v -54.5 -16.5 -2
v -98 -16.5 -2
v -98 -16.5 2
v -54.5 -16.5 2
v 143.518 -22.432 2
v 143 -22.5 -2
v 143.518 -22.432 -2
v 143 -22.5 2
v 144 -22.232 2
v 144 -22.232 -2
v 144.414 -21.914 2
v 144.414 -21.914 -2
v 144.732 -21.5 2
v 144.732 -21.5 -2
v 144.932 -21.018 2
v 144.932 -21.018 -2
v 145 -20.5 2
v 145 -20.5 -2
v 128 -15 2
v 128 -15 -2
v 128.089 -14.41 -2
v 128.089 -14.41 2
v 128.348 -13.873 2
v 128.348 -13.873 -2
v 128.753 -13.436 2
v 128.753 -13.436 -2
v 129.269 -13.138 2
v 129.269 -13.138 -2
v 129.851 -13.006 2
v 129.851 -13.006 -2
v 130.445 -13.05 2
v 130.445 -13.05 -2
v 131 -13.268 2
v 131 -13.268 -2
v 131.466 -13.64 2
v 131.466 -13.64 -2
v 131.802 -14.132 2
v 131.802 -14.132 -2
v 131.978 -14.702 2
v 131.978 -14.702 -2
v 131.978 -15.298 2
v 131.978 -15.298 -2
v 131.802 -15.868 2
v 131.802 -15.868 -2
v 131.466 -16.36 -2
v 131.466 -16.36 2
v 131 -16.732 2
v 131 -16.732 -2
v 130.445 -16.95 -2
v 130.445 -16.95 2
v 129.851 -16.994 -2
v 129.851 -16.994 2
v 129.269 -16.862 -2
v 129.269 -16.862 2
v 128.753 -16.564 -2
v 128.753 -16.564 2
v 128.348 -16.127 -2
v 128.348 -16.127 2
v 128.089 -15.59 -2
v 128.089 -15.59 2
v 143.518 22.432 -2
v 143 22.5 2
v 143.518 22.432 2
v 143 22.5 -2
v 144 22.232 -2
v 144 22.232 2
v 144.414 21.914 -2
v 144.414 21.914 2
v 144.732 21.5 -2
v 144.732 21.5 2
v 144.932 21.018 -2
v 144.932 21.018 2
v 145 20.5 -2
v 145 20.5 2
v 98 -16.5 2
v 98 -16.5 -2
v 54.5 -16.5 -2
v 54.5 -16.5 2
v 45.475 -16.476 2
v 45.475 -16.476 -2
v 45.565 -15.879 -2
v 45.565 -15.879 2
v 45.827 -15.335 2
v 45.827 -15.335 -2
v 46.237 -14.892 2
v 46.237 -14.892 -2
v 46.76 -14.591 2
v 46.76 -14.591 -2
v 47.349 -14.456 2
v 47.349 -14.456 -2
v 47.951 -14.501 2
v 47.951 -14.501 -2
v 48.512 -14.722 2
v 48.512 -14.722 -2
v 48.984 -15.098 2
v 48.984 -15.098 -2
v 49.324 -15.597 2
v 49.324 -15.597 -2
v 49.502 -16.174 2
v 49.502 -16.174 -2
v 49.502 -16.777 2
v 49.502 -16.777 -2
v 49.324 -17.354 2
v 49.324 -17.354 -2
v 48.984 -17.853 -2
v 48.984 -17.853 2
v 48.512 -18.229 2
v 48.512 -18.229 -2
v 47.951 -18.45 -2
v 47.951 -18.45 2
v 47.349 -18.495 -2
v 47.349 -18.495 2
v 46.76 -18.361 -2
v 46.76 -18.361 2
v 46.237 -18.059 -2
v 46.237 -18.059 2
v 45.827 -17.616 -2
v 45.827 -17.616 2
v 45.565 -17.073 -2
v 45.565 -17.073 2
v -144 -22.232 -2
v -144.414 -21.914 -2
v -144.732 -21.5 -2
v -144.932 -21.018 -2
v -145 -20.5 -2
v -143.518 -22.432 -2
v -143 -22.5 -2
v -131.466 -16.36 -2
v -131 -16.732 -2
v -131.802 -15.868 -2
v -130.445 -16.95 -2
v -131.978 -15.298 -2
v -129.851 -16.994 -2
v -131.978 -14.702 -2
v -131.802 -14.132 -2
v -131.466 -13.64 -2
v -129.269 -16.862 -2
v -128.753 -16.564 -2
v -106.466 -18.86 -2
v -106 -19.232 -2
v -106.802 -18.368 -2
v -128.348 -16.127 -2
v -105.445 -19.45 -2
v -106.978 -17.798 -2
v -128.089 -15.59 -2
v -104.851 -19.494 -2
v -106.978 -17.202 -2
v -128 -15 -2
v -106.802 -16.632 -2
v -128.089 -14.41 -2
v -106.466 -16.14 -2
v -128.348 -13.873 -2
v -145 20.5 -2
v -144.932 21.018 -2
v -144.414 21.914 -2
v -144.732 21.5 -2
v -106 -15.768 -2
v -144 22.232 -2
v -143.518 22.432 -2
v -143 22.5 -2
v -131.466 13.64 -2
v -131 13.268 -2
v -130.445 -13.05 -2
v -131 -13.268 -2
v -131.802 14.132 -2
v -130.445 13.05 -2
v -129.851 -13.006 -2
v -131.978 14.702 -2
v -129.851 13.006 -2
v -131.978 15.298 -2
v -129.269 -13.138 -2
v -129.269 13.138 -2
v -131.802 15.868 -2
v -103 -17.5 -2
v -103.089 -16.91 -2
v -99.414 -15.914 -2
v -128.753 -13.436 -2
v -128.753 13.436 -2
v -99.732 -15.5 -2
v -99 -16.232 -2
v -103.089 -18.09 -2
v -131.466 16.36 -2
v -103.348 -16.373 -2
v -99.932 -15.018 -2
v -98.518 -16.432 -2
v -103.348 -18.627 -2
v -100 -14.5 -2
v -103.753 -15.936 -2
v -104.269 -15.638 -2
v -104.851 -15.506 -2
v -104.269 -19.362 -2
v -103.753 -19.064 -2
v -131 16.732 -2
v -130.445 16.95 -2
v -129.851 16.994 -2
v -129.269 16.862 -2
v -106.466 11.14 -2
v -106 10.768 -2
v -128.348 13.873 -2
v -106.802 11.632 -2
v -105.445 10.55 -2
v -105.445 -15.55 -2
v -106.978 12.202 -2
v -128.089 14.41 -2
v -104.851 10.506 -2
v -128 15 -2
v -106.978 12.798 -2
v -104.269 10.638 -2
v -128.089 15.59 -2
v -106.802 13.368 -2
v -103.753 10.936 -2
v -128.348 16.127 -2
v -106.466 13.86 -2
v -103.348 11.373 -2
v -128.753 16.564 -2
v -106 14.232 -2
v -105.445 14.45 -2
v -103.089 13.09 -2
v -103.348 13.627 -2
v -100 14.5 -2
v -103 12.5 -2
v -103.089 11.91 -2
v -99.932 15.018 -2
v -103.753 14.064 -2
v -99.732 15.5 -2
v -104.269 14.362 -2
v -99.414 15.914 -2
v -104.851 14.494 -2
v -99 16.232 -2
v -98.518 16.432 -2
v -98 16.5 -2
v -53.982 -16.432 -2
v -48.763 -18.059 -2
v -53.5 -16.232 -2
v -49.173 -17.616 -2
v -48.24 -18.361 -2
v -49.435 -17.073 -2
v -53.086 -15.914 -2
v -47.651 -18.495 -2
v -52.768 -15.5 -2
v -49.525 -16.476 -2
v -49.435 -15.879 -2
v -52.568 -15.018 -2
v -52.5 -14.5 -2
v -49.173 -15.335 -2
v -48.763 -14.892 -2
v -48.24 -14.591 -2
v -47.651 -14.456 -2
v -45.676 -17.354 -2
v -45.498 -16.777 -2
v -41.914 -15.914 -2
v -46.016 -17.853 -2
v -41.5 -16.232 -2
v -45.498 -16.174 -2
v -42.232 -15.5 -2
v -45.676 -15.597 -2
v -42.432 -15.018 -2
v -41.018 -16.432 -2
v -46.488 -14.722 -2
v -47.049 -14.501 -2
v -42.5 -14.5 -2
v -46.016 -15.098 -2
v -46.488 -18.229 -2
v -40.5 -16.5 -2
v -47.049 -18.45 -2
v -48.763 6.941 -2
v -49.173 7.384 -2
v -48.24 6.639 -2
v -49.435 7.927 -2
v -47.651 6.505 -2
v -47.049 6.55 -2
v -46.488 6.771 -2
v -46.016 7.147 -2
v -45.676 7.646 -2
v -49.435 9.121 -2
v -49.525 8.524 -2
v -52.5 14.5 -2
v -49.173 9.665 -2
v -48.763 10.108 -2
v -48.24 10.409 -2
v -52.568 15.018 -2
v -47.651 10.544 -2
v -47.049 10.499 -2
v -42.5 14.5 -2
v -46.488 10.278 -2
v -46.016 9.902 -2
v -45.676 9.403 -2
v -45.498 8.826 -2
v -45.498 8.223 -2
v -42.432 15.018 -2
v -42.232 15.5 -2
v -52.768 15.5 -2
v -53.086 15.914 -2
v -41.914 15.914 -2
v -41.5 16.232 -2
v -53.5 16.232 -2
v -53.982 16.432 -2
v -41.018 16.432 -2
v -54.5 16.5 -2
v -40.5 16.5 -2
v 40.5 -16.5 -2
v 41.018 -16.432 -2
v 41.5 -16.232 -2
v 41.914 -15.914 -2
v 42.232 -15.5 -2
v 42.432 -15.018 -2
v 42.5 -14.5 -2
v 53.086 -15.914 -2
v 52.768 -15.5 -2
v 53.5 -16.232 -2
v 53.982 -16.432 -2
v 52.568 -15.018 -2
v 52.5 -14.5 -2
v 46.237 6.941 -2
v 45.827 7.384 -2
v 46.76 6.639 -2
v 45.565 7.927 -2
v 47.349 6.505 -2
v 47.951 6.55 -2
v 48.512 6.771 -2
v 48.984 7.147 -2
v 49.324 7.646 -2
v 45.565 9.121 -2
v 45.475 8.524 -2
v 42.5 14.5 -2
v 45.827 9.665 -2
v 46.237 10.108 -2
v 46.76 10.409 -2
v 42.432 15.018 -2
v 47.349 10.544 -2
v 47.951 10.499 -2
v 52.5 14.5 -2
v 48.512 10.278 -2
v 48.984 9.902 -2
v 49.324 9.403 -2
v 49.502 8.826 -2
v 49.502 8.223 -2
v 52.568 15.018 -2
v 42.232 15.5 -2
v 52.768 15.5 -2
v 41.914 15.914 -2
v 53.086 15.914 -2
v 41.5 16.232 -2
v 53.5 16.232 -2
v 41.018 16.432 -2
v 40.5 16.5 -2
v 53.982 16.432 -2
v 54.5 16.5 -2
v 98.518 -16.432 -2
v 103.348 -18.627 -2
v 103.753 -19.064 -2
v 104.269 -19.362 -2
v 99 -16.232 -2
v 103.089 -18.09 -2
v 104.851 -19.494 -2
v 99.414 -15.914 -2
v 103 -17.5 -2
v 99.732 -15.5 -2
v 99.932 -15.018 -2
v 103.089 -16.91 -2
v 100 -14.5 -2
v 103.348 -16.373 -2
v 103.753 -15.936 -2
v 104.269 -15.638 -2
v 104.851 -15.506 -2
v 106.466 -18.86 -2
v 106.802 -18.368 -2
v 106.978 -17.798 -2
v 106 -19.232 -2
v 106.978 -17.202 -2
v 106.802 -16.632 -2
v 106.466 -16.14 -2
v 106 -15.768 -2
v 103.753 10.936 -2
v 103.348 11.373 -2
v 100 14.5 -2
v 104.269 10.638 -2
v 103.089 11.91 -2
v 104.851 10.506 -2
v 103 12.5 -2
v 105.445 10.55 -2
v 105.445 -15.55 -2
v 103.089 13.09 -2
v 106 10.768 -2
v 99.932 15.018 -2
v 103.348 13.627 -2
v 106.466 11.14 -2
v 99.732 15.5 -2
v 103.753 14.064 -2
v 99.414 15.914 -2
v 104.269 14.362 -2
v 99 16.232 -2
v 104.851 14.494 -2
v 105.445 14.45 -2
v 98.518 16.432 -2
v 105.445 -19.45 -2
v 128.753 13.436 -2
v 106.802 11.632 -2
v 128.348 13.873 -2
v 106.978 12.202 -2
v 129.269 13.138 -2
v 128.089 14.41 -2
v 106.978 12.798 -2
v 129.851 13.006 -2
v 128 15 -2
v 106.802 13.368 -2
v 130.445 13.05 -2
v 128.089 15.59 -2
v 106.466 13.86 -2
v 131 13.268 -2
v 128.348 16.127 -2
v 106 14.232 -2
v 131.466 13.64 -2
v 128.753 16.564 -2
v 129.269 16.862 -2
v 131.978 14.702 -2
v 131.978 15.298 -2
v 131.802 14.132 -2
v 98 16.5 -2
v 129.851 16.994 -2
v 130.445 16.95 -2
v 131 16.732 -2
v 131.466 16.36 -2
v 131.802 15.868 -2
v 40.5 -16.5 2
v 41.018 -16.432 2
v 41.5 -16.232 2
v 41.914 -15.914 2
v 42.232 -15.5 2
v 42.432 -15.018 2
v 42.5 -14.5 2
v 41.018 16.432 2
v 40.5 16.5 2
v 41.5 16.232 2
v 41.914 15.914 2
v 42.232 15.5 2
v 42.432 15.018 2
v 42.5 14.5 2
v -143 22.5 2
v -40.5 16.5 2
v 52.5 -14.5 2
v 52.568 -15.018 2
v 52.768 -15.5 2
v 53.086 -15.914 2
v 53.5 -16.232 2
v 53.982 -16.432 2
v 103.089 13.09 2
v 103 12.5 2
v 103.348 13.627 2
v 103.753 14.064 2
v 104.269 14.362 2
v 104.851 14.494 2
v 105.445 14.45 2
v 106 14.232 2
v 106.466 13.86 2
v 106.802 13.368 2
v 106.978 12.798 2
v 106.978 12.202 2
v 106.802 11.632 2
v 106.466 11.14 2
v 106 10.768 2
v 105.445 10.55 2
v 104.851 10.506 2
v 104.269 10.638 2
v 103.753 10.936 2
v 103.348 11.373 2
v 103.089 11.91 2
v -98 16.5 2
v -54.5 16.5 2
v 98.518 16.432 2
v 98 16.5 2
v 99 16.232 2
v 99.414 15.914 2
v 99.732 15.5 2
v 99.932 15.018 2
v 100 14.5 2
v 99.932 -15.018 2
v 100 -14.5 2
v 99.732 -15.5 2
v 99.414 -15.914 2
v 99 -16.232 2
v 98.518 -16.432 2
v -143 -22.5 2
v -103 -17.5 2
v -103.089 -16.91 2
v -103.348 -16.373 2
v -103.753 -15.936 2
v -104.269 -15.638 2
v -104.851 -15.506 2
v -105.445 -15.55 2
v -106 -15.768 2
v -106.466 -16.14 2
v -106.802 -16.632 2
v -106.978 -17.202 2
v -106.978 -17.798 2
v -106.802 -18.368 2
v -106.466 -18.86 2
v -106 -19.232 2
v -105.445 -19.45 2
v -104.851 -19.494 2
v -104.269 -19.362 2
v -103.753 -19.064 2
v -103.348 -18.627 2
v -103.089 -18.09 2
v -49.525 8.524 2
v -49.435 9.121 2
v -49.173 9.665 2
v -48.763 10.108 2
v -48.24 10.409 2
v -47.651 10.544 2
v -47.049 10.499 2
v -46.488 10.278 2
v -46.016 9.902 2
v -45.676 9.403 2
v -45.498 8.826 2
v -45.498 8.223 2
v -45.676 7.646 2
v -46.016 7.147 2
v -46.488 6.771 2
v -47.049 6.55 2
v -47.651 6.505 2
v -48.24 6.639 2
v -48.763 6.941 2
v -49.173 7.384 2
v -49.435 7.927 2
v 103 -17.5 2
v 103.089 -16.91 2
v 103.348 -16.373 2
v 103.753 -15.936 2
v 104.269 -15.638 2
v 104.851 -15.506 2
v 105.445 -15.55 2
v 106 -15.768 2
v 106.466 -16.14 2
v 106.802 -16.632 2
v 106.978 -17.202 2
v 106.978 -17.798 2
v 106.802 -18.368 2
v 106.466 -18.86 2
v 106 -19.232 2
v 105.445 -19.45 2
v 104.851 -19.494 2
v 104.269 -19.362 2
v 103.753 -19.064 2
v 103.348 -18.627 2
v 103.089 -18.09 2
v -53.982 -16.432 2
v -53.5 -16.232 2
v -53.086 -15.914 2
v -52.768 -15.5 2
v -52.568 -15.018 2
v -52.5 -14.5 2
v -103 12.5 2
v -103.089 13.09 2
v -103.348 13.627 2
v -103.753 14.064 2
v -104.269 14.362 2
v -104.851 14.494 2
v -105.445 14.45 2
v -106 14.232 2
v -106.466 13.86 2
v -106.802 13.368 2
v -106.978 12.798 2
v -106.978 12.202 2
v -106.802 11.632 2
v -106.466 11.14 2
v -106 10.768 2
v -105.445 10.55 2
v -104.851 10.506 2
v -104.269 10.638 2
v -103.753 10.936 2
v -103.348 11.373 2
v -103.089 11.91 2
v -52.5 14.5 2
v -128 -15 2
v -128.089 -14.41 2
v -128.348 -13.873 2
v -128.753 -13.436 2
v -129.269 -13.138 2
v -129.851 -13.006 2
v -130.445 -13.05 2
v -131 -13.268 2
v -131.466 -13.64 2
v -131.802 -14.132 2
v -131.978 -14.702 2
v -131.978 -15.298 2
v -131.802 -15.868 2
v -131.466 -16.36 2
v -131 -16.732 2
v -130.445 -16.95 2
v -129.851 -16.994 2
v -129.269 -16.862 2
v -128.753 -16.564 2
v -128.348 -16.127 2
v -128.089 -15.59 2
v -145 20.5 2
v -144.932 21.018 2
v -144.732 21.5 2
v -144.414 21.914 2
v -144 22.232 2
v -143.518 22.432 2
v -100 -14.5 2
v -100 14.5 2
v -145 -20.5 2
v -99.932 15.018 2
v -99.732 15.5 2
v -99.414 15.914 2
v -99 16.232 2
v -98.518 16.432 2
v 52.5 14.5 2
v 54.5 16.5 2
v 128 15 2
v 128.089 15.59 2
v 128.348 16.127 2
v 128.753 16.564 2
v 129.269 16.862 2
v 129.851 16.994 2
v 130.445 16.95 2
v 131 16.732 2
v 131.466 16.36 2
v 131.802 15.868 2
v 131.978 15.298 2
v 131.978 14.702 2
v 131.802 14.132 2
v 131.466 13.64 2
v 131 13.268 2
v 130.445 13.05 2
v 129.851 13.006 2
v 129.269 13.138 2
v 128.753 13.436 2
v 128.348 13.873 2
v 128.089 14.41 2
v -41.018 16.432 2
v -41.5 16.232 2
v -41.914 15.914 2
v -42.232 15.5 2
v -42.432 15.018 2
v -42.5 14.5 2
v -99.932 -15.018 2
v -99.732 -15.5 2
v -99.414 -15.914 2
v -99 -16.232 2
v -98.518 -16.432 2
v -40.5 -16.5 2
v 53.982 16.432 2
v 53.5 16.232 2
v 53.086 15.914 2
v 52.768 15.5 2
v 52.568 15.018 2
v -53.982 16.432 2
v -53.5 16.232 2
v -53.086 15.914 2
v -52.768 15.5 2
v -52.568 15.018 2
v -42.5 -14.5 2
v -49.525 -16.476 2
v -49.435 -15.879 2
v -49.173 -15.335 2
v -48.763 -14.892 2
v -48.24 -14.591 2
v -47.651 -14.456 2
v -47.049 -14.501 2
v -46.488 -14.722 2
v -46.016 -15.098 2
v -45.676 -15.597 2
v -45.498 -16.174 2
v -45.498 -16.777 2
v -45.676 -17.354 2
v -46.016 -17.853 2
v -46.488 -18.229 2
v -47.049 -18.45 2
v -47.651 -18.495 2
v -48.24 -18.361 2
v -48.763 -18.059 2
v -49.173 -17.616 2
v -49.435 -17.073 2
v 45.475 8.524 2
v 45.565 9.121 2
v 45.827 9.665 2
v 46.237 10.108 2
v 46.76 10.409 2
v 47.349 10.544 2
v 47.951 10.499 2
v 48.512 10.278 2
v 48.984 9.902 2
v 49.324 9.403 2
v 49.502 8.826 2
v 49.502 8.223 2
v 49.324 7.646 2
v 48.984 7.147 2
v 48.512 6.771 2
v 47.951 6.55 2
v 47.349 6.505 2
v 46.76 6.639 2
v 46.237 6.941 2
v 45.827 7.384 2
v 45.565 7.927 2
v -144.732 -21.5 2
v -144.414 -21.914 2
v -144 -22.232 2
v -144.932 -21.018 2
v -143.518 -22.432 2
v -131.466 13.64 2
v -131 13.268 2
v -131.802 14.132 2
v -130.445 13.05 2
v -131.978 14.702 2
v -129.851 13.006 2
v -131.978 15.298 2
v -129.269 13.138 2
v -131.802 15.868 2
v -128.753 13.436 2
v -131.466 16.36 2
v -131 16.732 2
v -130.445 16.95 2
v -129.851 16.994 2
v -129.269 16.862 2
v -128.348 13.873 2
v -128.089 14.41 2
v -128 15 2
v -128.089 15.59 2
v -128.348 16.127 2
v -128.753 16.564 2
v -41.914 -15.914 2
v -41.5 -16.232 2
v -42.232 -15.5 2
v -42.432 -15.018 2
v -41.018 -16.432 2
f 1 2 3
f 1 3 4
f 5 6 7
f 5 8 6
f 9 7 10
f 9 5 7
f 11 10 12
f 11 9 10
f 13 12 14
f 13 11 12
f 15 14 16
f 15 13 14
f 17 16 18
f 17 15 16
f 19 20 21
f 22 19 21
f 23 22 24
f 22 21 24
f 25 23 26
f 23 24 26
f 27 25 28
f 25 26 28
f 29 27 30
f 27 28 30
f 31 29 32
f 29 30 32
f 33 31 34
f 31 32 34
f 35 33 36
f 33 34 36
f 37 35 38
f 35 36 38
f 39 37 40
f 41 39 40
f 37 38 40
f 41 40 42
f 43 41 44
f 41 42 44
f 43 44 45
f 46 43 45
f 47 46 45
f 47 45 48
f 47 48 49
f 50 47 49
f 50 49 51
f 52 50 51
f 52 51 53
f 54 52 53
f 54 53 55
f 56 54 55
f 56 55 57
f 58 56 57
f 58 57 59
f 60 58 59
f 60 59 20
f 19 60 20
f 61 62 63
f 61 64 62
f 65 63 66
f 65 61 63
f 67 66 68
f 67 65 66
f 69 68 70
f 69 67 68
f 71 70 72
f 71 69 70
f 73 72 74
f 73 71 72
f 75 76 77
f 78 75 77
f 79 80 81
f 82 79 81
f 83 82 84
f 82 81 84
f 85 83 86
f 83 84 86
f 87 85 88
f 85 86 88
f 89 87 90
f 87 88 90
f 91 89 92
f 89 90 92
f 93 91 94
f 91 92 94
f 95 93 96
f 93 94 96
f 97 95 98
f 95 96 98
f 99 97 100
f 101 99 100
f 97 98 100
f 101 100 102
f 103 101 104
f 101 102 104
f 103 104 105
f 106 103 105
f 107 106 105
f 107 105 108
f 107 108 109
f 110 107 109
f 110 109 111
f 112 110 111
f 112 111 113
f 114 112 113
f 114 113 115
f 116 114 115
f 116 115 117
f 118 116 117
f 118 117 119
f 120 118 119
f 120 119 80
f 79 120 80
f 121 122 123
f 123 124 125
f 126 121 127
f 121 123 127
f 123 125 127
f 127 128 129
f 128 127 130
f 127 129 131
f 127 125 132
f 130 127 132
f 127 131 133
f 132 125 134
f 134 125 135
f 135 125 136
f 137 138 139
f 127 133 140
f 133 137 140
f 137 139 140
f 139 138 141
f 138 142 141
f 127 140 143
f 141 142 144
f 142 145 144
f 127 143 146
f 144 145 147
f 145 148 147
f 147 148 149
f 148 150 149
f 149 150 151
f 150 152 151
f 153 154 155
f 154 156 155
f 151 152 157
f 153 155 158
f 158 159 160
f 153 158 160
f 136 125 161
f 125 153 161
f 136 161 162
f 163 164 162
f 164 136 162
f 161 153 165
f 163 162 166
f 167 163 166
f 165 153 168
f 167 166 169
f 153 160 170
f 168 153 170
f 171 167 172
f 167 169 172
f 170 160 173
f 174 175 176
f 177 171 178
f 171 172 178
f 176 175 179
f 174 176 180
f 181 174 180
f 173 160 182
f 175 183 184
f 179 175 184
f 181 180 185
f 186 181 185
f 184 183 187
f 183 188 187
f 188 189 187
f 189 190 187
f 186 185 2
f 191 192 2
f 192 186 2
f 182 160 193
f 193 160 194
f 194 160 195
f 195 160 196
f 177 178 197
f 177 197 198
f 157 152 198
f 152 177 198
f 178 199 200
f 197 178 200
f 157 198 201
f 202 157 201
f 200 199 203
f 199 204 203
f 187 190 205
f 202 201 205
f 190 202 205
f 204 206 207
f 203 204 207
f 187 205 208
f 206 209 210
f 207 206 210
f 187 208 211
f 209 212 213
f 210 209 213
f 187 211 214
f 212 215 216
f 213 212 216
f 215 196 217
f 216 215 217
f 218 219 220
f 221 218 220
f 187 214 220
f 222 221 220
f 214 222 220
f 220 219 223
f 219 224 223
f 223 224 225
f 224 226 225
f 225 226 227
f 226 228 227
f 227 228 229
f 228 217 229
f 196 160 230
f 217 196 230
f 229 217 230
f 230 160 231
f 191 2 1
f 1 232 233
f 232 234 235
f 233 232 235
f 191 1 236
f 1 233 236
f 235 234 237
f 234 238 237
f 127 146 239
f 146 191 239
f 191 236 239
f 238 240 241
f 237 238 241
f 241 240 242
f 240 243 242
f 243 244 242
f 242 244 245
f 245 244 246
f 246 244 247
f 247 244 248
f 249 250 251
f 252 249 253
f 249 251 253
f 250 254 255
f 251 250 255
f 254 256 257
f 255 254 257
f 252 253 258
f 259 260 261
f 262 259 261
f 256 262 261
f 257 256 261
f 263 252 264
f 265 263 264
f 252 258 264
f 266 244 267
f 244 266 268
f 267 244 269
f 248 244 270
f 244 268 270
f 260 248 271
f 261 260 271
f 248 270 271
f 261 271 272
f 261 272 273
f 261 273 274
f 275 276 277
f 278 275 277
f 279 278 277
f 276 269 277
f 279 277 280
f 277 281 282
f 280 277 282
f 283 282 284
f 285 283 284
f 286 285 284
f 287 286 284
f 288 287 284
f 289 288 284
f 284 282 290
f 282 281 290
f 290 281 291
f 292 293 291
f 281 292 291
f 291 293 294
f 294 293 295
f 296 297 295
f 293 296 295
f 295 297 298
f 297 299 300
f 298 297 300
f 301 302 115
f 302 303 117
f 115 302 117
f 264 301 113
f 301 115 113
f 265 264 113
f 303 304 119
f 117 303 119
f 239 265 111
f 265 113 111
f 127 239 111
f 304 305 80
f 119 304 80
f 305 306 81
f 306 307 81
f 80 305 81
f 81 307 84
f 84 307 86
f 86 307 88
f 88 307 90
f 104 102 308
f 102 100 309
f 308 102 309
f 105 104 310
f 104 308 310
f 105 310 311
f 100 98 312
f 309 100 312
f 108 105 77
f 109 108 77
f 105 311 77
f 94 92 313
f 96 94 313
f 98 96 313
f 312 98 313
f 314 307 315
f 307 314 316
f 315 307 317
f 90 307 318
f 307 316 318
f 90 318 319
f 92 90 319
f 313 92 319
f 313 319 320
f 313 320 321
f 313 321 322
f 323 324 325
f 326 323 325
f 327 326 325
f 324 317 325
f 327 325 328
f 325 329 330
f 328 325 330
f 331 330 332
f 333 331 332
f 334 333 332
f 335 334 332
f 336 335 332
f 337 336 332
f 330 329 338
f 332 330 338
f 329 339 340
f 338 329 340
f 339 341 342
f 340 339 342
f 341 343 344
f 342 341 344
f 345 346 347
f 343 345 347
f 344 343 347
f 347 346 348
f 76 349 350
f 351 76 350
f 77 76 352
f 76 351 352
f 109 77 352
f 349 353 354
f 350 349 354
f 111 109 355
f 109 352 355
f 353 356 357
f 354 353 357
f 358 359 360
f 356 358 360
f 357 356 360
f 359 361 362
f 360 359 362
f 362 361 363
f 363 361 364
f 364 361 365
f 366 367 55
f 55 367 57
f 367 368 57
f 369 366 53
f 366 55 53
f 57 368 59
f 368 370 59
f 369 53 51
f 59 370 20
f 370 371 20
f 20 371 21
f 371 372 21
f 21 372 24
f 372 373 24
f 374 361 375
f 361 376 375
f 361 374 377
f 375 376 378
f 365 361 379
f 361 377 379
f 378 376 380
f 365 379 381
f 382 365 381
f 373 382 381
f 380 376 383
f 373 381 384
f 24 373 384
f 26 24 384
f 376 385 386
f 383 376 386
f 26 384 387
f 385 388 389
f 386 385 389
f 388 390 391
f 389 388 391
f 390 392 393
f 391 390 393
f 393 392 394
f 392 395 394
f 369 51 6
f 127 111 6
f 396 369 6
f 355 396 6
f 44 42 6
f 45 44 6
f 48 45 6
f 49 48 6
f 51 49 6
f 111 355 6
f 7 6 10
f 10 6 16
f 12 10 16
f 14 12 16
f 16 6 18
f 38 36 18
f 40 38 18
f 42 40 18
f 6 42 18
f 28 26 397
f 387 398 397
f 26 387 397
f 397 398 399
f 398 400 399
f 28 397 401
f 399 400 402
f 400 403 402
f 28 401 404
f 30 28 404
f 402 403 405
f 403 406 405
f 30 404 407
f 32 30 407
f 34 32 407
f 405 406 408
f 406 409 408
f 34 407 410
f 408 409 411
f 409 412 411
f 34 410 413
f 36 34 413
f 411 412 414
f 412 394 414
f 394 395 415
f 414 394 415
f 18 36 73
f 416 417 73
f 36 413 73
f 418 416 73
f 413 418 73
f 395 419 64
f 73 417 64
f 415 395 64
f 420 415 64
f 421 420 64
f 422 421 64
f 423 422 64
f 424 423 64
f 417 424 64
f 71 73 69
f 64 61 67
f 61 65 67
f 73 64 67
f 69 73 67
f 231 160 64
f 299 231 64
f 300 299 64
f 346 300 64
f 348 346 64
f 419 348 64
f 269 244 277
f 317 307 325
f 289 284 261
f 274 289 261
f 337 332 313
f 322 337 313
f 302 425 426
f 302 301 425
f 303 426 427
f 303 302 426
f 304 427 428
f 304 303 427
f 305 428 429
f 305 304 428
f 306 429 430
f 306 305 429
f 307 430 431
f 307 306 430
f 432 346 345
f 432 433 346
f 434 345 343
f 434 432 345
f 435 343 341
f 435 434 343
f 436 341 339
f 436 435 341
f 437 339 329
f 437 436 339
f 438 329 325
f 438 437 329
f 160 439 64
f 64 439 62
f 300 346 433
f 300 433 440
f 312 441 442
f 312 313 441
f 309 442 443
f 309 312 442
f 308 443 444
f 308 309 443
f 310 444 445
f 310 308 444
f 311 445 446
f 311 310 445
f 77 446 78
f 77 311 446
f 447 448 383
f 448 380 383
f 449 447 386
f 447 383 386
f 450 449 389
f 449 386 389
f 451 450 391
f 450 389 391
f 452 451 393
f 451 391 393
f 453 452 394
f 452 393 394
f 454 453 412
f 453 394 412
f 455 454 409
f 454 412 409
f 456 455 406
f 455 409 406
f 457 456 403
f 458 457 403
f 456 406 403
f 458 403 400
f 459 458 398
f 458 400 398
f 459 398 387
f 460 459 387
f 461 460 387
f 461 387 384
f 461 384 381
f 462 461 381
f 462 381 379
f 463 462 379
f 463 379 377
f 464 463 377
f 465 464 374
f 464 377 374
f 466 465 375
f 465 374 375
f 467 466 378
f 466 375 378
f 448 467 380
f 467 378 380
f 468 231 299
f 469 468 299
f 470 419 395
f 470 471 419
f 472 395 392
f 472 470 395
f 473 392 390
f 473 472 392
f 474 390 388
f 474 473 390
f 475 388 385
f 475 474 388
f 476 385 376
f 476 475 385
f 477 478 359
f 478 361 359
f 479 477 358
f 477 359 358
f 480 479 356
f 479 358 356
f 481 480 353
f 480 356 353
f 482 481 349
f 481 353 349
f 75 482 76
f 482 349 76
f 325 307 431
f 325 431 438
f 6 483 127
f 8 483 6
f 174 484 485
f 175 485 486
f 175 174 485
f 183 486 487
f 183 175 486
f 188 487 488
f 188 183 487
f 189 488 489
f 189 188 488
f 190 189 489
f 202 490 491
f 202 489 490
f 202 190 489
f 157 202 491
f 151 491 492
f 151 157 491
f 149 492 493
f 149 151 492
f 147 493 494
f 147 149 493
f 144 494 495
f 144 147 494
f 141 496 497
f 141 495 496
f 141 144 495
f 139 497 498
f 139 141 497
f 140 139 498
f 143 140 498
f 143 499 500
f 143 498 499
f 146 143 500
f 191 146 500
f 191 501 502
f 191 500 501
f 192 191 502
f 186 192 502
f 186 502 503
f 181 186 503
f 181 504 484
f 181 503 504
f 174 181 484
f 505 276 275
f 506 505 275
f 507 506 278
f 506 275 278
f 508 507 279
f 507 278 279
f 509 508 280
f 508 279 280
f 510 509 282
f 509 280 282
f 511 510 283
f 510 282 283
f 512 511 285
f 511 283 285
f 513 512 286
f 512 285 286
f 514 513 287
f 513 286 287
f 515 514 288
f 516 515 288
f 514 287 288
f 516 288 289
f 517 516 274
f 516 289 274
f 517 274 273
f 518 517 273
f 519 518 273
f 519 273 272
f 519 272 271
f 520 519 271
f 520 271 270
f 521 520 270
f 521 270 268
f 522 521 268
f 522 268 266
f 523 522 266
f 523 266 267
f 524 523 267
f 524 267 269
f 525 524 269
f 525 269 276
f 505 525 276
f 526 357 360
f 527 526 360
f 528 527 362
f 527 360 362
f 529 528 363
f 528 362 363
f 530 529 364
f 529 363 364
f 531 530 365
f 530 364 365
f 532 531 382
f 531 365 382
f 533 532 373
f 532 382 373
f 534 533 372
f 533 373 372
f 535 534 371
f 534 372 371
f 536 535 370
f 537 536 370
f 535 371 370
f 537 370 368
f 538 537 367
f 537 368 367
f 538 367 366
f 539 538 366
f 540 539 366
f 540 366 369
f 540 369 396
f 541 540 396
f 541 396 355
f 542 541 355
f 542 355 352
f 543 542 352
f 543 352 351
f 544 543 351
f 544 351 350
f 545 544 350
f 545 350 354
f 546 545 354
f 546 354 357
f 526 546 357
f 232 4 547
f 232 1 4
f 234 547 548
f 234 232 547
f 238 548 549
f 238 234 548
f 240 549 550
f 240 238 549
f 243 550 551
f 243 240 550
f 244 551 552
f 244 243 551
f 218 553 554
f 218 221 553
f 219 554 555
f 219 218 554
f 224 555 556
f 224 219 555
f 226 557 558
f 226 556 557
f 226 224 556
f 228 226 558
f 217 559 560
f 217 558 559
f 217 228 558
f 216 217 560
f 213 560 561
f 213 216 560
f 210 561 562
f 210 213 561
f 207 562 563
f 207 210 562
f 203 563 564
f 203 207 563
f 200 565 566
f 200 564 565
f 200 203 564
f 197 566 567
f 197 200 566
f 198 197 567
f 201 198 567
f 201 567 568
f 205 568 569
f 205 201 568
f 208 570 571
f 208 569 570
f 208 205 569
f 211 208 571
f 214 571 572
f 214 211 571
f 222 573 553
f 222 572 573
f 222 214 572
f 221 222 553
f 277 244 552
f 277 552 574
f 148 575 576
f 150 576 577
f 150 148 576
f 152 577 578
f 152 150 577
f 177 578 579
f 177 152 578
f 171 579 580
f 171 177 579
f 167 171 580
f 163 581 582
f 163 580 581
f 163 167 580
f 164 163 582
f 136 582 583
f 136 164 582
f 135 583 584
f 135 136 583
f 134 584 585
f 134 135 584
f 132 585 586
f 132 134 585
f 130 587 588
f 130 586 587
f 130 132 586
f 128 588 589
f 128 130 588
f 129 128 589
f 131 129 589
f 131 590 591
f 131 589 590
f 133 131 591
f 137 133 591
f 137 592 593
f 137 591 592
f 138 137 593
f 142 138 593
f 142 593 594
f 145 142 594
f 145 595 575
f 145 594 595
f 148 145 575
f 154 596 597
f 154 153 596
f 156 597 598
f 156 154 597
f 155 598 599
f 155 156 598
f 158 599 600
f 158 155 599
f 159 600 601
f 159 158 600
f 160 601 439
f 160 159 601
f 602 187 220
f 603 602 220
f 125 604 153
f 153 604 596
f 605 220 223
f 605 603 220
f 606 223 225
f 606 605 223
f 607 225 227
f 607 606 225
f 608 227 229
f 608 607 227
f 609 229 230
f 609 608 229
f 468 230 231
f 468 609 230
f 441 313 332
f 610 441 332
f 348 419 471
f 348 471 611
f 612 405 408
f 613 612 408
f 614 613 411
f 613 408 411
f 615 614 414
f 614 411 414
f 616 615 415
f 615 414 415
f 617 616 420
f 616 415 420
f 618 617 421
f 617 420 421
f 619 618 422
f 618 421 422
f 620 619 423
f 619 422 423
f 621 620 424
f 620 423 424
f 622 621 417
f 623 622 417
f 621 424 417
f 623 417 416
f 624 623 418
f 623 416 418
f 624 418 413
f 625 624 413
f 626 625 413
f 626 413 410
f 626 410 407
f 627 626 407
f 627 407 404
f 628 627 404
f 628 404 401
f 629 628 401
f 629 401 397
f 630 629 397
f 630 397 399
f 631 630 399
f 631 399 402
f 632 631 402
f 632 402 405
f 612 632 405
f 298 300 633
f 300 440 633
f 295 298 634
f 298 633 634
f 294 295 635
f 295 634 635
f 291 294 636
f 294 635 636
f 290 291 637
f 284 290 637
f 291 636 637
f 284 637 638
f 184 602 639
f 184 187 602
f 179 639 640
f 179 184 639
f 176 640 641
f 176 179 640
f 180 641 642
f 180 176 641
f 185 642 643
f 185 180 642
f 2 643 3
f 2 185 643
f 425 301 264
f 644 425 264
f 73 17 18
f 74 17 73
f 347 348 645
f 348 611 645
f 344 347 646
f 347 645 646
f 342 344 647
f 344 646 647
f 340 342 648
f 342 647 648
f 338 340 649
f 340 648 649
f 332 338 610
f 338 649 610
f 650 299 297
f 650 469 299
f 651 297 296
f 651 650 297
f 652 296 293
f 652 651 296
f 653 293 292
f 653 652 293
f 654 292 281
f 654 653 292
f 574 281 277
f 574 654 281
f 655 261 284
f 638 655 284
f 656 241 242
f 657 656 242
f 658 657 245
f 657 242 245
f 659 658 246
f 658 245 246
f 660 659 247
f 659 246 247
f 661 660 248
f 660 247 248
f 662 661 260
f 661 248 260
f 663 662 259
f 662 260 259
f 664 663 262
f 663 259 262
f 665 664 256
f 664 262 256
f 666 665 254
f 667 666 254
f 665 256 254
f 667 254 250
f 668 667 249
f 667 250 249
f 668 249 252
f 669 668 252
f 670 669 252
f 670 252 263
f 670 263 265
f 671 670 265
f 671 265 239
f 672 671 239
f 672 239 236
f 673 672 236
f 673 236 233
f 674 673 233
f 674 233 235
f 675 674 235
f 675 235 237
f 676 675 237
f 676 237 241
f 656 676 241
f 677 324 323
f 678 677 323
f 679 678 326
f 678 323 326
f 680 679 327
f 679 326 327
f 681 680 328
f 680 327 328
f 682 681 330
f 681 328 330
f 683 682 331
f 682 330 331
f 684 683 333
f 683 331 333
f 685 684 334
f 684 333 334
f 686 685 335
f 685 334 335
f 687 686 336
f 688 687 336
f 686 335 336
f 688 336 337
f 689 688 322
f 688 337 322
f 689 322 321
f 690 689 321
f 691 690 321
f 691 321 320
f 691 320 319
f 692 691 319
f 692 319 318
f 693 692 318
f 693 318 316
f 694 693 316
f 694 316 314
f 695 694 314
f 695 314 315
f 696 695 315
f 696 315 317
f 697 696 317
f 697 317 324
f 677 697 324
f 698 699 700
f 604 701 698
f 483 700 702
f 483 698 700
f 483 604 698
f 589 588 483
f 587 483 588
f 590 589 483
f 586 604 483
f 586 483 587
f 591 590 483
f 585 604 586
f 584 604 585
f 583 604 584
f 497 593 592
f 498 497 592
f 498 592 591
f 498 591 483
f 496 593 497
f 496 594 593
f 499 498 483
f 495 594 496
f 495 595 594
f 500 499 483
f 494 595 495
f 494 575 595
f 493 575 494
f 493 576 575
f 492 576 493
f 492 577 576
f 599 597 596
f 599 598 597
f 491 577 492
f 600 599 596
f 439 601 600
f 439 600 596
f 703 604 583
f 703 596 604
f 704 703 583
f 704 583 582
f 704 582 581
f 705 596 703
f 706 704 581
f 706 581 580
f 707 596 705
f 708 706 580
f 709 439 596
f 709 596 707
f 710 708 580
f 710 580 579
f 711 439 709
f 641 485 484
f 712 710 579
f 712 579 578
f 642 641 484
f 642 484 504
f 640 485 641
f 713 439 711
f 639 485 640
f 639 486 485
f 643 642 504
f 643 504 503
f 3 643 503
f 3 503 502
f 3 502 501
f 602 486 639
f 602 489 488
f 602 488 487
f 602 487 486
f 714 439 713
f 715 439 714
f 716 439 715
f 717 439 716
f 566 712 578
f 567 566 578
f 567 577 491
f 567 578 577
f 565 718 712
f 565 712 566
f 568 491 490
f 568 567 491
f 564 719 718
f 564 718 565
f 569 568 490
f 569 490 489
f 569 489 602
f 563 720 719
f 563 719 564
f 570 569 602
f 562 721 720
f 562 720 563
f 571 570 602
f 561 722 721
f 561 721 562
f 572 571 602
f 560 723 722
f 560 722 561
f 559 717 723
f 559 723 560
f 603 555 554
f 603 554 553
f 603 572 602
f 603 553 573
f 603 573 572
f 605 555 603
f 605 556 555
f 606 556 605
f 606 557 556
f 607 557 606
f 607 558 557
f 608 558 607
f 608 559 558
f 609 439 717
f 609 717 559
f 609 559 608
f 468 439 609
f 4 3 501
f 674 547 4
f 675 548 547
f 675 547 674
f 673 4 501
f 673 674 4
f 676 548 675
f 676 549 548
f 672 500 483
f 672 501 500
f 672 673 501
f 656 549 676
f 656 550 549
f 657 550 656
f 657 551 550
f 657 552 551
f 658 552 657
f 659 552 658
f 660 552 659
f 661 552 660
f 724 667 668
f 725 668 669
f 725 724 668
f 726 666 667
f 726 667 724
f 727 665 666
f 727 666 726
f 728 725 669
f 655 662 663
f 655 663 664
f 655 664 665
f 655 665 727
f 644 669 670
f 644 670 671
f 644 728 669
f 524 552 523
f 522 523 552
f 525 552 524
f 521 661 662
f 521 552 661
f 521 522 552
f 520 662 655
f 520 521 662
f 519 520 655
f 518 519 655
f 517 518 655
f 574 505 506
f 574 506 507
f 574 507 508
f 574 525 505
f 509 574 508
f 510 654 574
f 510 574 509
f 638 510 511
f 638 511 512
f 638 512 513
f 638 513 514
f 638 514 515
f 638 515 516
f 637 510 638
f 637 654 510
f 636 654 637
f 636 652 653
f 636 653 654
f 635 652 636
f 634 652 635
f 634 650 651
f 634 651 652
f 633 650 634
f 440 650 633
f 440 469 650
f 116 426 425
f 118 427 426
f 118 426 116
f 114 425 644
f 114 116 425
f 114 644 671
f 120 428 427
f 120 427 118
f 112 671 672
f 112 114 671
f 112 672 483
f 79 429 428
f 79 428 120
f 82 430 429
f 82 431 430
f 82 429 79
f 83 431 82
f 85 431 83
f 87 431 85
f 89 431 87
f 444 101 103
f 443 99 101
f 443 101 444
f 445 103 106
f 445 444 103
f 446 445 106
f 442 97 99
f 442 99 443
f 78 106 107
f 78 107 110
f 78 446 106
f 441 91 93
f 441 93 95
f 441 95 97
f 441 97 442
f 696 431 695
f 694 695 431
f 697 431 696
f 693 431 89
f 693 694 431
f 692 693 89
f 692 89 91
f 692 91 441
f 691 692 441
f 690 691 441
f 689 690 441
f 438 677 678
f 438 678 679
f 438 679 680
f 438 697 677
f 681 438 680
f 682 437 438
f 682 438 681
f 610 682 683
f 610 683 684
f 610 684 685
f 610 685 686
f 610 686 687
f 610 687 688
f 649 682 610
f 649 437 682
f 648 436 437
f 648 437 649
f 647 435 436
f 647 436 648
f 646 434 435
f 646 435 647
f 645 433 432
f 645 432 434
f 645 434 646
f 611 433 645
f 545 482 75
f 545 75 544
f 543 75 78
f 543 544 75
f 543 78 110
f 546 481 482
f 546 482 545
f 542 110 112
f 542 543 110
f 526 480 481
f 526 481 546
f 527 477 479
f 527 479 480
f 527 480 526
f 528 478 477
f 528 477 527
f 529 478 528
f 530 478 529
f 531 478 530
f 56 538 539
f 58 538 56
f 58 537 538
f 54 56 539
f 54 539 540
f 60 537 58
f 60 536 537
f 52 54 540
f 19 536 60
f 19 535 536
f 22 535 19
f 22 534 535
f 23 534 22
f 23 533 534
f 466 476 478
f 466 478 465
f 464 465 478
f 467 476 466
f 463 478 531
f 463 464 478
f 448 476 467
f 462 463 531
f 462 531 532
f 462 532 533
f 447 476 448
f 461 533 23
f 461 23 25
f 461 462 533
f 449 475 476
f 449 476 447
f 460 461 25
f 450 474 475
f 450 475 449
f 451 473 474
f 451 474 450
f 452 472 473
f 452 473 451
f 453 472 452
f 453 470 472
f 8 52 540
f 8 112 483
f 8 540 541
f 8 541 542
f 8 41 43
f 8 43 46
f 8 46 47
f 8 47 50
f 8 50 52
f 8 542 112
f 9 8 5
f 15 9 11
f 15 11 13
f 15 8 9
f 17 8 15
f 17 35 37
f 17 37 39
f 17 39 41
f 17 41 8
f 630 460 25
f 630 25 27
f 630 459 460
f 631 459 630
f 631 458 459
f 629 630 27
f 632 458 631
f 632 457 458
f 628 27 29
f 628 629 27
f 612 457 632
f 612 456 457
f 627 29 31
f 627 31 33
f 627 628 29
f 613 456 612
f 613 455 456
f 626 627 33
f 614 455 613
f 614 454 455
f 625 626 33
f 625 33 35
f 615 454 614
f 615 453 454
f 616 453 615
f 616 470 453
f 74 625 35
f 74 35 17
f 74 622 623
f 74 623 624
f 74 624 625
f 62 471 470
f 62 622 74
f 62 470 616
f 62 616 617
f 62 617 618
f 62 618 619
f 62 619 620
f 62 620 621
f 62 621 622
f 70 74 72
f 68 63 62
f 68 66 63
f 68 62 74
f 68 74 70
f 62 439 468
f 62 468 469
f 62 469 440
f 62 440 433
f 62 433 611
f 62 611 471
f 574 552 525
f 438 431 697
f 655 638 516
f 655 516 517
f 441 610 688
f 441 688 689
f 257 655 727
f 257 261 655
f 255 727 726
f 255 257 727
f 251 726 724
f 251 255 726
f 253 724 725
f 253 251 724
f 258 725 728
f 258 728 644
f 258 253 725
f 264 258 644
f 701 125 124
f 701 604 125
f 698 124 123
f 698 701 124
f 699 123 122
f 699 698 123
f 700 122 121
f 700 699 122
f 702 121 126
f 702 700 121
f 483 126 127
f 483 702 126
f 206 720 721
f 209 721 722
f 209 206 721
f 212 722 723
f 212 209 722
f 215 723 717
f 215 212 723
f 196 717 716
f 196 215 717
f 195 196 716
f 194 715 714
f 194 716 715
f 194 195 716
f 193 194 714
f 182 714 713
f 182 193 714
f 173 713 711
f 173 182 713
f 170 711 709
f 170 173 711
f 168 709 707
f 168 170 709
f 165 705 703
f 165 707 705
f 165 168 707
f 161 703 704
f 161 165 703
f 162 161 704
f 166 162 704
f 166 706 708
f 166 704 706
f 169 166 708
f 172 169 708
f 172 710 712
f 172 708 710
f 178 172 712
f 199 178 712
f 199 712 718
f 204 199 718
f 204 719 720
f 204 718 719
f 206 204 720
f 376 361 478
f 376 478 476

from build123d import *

# Parameters (mm, degrees)
SKETCH_1_W          = 290
SKETCH_1_H          = 45
EXTRUDE_1_DEPTH     = 2
SKETCH_3_R          = 2.025
CUT_EXTRUDE_1_DEPTH = 10
SKETCH_4_R          = 2
CUT_EXTRUDE_2_DEPTH = 10
SKETCH_5_R          = 2
CUT_EXTRUDE_3_DEPTH = 35
SKETCH_6_W          = 47.500000831
SKETCH_6_H          = 33
CUT_EXTRUDE_4_DEPTH = 129.5
SKETCH_7_W          = 84.999998338
SKETCH_7_H          = 33
CUT_EXTRUDE_5_DEPTH = 129.5
FILLET_1_R          = 2
FILLET_2_R          = 2


with BuildPart() as part:
    # 草图1 → 凸台-拉伸1 (new, symmetric)
    with BuildSketch(Plane.XY):
        Rectangle(SKETCH_1_W, SKETCH_1_H)
    extrude(amount=EXTRUDE_1_DEPTH, both=True)

    # 草图3 → 切除-拉伸1 (cut)
    with BuildSketch(Plane(origin=(0, 0, -2), x_dir=(-1, 0, 0), z_dir=(0, 0, -1))):
        with Locations((-47.499999169, 8.524320115)):
            Circle(SKETCH_3_R)
        with Locations((-47.499999169, -16.475679885)):
            Circle(SKETCH_3_R)
        with Locations((47.500000831, 8.524320115)):
            Circle(SKETCH_3_R)
        with Locations((47.500000831, -16.475679885)):
            Circle(SKETCH_3_R)
    extrude(amount=-CUT_EXTRUDE_1_DEPTH, mode=Mode.SUBTRACT)

    # 草图4 → 切除-拉伸2 (cut)
    with BuildSketch(Plane(origin=(0, 0, -2), x_dir=(-1, 0, 0), z_dir=(0, 0, -1))):
        with Locations((-130, 15)):
            Circle(SKETCH_4_R)
        with Locations((-130, -15)):
            Circle(SKETCH_4_R)
    cut_extrude_2 = extrude(amount=-CUT_EXTRUDE_2_DEPTH, mode=Mode.SUBTRACT)

    # 镜向1: 切除-拉伸2 across plane
    add(cut_extrude_2.mirror(Plane(origin=(0, 0, 0), x_dir=(0, 0, 1), z_dir=(1, 0, 0))), mode=Mode.SUBTRACT)

    # 草图5 → 切除-拉伸3 (cut, symmetric)
    with BuildSketch(Plane(origin=(0, 0, -2), x_dir=(-1, 0, 0), z_dir=(0, 0, -1))):
        with Locations((-105, -17.5)):
            Circle(SKETCH_5_R)
        with Locations((-105, 12.5)):
            Circle(SKETCH_5_R)
    cut_extrude_3 = extrude(amount=CUT_EXTRUDE_3_DEPTH, both=True, mode=Mode.SUBTRACT)

    # 镜向2: 切除-拉伸3 across plane
    add(cut_extrude_3.mirror(Plane(origin=(0, 0, 0), x_dir=(0, 0, 1), z_dir=(1, 0, 0))), mode=Mode.SUBTRACT)

    # 草图6 → 切除-拉伸4 (cut, symmetric)
    with BuildSketch(Plane(origin=(0, 0, -2), x_dir=(-1, 0, 0), z_dir=(0, 0, -1))):
        with Locations((-76.249999585, 0)):
            Rectangle(SKETCH_6_W, SKETCH_6_H)
    cut_extrude_4 = extrude(amount=CUT_EXTRUDE_4_DEPTH, both=True, mode=Mode.SUBTRACT)

    # 镜向3: 切除-拉伸4 across plane
    add(cut_extrude_4.mirror(Plane(origin=(0, 0, 0), x_dir=(0, 0, 1), z_dir=(1, 0, 0))), mode=Mode.SUBTRACT)

    # 草图7 → 切除-拉伸5 (cut, symmetric)
    with BuildSketch(Plane(origin=(0, 0, -2), x_dir=(-1, 0, 0), z_dir=(0, 0, -1))):
        Rectangle(SKETCH_7_W, SKETCH_7_H)
    extrude(amount=CUT_EXTRUDE_5_DEPTH, both=True, mode=Mode.SUBTRACT)

    # 圆角1
    fillet_1_edges = [part.edges().sort_by_distance(p)[0] for p in [
        (-52.499999169, -16.5, 0),
        (-52.499999169, 16.5, 0),
        (-100, 16.5, 0),
        (-100, -16.5, 0),
        (-42.499999169, 16.5, 0),
        (-42.499999169, -16.5, 0),
        (42.499999169, -16.5, 0),
        (42.499999169, 16.5, 0),
        (52.499999169, 16.5, 0),
        (52.499999169, -16.5, 0),
        (100, -16.5, 0),
        (100, 16.5, 0),
    ]]
    fillet(fillet_1_edges, radius=FILLET_1_R)

    # 圆角2
    fillet_2_edges = [part.edges().sort_by_distance(p)[0] for p in [
        (145, -22.5, 0),
        (-145, -22.5, 0),
        (-145, 22.5, 0),
        (145, 22.5, 0),
    ]]
    fillet(fillet_2_edges, radius=FILLET_2_R)


solid = part.part
